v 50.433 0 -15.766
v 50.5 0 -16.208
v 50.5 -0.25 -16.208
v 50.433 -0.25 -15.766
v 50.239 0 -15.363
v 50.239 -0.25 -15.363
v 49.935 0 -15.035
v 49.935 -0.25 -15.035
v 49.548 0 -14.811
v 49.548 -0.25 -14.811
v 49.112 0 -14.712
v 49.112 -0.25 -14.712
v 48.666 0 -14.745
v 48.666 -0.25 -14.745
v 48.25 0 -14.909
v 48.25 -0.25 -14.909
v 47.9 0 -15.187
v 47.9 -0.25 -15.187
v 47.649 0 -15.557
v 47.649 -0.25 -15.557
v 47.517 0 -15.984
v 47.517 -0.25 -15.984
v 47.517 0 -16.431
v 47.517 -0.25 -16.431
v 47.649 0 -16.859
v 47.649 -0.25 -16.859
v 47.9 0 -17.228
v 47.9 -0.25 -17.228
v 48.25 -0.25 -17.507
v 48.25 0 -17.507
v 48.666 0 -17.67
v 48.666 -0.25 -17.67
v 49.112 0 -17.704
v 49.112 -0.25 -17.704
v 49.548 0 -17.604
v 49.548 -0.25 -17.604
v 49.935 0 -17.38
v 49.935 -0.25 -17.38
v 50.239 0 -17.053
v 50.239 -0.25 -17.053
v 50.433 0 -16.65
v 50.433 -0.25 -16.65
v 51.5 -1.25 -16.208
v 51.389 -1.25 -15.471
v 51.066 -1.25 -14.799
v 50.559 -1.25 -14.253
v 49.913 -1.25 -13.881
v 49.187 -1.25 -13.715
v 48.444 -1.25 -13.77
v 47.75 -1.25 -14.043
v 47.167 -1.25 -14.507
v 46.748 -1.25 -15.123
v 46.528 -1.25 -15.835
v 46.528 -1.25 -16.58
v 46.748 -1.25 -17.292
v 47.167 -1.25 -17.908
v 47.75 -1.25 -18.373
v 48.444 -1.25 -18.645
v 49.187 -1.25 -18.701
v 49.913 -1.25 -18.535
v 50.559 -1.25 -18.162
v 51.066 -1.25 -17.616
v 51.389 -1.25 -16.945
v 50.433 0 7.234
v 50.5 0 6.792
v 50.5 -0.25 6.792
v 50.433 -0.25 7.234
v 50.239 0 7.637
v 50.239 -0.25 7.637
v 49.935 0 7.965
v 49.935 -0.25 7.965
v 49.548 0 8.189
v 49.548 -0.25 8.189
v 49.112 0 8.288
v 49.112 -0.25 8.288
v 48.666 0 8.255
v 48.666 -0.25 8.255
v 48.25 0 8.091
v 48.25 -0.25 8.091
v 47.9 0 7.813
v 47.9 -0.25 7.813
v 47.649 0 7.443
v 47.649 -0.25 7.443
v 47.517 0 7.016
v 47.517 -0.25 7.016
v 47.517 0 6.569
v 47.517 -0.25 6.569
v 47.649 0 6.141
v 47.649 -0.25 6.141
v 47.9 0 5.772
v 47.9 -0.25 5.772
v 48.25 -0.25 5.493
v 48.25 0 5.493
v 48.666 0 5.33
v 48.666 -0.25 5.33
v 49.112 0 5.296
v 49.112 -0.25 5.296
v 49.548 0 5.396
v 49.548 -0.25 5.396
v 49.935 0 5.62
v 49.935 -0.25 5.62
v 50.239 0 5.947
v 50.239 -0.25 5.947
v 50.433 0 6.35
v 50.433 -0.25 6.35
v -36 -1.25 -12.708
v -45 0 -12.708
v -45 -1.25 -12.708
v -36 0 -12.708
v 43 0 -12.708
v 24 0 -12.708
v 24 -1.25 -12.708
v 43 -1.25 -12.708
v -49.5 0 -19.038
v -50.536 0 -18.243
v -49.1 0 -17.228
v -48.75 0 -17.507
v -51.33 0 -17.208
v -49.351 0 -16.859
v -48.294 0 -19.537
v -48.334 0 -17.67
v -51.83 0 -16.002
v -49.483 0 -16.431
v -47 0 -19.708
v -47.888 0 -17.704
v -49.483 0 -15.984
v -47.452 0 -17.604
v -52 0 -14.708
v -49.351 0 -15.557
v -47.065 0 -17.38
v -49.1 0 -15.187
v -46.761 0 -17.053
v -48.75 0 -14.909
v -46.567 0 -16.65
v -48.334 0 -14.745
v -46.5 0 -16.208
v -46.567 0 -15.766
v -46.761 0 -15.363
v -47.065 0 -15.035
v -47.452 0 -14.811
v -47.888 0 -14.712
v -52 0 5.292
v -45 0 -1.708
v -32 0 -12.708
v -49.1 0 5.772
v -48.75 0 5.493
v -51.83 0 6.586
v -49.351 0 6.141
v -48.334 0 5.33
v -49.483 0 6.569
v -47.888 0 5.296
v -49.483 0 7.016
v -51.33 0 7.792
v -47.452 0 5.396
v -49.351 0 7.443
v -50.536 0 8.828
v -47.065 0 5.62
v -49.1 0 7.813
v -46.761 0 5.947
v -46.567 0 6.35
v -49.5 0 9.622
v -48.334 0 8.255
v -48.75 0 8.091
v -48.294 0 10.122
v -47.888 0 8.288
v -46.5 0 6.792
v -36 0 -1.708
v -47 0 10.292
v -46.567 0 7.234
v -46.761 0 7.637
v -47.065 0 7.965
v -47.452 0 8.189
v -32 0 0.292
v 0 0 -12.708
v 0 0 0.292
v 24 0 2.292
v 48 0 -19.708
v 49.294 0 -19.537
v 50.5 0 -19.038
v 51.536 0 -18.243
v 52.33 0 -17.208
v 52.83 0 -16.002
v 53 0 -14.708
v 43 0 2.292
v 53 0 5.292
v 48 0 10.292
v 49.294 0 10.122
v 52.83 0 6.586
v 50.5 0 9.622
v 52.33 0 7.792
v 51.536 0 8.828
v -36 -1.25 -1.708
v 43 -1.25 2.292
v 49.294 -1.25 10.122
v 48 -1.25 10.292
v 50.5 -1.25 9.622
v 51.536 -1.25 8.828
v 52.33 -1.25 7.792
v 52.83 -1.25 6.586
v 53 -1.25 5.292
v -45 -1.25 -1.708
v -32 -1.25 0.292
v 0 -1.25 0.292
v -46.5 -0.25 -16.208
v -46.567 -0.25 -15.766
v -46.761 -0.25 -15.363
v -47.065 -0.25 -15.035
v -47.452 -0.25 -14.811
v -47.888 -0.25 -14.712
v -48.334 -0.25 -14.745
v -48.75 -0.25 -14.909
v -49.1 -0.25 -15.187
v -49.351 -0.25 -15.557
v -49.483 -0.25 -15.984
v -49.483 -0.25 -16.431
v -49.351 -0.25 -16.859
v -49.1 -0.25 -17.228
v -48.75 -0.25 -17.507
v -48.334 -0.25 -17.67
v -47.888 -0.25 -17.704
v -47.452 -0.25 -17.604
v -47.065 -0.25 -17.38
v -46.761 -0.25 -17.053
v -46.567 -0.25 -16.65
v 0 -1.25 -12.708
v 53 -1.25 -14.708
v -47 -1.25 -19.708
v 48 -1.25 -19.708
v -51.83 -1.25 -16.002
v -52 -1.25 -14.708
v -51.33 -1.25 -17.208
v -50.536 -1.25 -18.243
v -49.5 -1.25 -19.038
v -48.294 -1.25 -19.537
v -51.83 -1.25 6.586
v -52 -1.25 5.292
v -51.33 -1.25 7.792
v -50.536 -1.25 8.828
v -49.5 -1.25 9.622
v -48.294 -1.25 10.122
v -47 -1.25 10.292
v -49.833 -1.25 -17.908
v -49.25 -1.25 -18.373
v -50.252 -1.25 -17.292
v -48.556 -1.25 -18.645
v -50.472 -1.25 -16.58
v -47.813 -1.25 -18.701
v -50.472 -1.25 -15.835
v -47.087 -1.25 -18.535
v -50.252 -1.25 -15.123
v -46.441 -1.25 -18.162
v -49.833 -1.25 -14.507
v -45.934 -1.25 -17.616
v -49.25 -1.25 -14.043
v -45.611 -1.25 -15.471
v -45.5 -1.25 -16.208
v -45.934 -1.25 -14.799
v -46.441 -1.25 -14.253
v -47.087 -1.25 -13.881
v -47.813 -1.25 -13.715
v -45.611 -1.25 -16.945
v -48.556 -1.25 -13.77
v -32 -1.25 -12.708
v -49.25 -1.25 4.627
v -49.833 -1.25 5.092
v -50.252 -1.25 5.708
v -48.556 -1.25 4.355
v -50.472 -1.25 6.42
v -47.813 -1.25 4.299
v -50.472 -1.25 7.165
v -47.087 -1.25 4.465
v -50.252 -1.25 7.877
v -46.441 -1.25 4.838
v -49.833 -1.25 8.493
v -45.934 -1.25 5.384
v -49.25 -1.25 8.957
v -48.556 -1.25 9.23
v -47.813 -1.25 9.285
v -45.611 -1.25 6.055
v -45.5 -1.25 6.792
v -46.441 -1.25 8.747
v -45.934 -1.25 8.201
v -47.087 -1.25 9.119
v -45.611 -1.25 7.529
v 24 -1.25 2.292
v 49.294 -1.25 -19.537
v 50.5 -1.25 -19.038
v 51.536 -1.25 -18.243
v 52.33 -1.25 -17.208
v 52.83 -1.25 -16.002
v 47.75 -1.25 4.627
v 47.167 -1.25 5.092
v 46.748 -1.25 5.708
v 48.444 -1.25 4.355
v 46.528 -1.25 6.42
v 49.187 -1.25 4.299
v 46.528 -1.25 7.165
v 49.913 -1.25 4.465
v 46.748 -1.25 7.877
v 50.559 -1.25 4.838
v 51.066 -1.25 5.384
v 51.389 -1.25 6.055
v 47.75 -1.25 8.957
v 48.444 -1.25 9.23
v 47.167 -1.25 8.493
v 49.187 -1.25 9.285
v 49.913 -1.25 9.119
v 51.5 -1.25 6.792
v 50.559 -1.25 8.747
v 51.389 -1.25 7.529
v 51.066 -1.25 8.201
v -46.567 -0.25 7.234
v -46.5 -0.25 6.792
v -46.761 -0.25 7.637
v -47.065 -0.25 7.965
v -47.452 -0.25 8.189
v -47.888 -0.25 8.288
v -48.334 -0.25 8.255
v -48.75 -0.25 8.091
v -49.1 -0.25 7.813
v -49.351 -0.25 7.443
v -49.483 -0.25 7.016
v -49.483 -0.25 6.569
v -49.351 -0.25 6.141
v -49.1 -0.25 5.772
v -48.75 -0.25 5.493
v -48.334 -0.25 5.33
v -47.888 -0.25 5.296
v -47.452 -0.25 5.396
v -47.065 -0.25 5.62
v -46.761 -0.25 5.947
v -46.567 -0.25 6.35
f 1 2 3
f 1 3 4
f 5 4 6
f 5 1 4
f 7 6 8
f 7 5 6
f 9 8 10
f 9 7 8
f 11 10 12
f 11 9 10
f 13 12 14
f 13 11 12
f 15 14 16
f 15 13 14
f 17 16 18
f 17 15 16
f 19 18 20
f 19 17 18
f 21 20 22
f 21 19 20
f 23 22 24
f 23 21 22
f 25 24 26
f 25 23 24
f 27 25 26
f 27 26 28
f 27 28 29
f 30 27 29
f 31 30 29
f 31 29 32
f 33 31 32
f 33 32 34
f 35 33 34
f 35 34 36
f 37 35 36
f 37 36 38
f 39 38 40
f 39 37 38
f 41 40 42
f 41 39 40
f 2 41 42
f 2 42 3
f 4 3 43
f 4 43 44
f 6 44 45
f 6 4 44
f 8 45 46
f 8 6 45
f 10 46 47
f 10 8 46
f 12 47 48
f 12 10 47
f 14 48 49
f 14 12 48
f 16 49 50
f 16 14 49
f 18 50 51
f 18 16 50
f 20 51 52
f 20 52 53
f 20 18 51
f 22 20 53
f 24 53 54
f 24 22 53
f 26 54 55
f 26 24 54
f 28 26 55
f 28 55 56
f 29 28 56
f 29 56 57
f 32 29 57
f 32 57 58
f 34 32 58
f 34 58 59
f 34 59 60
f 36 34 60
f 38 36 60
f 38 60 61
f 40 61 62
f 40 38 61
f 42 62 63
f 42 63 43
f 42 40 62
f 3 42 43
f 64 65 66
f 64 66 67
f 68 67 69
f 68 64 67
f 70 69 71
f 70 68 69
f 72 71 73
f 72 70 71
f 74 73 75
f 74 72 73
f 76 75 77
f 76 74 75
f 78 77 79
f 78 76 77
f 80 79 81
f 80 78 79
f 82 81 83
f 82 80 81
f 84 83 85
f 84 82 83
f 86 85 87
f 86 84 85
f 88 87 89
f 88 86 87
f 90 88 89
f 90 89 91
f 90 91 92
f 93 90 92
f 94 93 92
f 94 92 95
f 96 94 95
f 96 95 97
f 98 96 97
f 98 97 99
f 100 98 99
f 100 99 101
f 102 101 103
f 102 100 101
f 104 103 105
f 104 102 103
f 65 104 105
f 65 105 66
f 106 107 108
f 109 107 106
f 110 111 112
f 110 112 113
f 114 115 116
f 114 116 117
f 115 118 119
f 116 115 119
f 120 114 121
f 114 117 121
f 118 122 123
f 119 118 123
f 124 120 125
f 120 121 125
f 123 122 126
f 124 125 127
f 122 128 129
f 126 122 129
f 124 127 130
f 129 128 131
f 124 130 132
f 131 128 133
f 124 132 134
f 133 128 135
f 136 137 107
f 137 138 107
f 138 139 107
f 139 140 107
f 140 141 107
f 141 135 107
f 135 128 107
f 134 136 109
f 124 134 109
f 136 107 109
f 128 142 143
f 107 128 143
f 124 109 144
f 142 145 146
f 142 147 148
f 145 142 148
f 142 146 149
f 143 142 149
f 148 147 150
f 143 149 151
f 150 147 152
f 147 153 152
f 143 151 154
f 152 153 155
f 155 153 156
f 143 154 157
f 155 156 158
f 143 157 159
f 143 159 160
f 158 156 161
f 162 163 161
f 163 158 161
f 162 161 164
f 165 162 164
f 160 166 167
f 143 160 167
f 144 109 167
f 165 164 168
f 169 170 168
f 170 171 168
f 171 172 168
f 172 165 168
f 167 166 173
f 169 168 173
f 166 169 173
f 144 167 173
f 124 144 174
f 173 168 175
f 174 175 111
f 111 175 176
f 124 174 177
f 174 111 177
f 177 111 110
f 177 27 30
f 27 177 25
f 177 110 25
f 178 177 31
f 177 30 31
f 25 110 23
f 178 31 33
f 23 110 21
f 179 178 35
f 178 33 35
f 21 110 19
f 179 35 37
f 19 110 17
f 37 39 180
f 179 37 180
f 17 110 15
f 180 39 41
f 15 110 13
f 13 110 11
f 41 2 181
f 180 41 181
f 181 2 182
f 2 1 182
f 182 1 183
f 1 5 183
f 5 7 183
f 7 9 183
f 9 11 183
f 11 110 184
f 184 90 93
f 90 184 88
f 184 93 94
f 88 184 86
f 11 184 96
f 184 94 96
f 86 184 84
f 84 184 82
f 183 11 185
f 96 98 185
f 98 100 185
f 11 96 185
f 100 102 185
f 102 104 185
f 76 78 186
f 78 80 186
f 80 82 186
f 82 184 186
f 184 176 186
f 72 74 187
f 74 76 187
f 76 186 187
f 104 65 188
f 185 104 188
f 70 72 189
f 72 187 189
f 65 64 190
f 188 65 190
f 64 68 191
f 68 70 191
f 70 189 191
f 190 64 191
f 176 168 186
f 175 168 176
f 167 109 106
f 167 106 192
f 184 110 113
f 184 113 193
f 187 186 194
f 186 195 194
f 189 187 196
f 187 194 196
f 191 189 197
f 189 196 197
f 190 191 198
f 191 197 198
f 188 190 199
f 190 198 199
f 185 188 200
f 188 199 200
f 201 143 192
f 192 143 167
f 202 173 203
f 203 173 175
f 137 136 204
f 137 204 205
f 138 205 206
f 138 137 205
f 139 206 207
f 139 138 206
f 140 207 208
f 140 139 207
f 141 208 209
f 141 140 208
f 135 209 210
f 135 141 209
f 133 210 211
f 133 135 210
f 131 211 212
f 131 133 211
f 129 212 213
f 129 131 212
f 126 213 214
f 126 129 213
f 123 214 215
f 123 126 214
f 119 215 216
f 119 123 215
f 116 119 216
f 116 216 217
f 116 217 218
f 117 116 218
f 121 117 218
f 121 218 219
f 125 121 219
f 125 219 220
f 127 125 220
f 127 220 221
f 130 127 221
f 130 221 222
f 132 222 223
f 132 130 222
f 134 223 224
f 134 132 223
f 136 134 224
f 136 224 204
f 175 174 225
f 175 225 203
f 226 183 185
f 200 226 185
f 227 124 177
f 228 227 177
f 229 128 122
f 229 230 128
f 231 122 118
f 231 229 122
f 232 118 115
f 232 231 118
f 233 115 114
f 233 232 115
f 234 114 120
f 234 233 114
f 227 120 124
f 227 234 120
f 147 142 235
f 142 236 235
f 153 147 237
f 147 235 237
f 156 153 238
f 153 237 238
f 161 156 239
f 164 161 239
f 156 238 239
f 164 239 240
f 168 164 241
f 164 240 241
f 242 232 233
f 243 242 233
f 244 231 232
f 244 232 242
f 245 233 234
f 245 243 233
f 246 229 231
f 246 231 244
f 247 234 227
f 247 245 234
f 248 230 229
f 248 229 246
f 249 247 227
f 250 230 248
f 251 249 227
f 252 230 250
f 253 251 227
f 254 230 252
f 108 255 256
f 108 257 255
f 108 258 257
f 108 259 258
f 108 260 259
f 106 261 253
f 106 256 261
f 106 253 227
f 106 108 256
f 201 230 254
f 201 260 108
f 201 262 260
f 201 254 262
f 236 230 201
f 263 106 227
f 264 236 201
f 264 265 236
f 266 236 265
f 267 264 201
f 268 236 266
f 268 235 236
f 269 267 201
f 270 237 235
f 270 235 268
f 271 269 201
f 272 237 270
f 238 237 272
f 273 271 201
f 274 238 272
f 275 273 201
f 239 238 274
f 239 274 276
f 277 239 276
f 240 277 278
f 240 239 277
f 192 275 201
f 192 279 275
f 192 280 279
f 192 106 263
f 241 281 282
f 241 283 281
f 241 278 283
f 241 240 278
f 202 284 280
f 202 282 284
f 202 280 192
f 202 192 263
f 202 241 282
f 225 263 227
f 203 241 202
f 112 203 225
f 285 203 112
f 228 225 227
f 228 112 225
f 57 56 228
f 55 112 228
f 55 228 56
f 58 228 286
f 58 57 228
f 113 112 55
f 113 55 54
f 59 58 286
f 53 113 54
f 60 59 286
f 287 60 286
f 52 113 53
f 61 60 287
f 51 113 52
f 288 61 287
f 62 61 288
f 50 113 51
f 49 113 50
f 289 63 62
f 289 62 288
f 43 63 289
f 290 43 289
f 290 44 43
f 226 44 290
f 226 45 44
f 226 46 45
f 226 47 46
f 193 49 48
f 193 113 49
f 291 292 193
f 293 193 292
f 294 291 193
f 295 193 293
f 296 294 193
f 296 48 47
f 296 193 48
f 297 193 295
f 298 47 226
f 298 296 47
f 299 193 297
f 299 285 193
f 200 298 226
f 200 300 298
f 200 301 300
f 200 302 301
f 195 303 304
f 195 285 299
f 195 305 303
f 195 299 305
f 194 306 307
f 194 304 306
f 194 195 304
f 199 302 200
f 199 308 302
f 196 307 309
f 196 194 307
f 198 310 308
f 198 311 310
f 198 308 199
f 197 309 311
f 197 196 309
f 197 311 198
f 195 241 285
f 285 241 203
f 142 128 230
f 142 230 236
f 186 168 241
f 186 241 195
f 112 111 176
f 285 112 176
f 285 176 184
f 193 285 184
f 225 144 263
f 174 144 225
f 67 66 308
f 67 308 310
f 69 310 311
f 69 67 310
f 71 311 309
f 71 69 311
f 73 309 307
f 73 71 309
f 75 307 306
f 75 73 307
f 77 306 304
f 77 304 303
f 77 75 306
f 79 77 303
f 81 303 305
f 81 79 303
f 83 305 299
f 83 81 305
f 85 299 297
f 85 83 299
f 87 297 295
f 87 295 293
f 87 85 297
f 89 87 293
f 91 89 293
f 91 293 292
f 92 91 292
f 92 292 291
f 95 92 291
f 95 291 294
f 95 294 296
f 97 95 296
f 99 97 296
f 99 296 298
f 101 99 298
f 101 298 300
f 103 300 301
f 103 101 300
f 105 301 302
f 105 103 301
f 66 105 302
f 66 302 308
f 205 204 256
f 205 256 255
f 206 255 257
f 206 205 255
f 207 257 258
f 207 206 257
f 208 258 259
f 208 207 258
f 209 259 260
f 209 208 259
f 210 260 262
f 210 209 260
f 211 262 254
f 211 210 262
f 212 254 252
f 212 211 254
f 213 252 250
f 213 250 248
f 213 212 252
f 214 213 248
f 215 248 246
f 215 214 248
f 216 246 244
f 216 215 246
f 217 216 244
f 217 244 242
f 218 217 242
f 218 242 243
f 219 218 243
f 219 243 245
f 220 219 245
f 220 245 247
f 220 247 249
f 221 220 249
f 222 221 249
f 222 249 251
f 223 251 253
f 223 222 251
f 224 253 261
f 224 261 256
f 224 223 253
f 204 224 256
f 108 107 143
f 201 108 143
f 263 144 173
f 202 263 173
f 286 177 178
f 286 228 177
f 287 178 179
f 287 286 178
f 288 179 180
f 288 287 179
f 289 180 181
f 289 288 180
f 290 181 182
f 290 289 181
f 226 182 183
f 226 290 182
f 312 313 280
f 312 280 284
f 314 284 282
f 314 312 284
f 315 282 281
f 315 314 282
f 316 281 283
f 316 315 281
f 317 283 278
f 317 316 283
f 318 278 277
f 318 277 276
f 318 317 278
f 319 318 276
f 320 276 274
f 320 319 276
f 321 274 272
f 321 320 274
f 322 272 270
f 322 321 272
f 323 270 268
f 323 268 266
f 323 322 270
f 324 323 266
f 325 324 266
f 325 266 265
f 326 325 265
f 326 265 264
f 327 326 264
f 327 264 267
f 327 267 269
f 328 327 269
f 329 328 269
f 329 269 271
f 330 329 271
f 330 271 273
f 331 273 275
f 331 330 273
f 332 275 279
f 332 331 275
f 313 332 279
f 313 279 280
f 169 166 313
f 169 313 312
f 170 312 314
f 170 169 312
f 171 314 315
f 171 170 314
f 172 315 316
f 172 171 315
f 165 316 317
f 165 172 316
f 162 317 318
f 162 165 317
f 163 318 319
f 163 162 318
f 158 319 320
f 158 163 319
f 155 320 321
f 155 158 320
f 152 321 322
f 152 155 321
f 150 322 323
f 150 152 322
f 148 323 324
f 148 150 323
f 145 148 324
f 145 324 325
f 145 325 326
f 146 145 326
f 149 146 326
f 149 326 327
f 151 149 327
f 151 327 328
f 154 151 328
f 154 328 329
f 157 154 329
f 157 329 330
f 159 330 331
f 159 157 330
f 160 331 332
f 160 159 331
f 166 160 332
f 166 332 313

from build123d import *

# Parameters (mm, degrees)
F0_W     = 105
F0_H     = 30
F0_R     = 1.5
F0_W_2   = 9
F0_H_2   = 11
F0_W_3   = 32
F0_H_3   = 13
F0_W_4   = 19
F0_H_4   = 15
F1_DEPTH = 1.25
F2_R     = 5
F3_SIZE  = 1


with BuildPart() as f1:
    # F0 (on Front) → F1 (new body)
    with BuildSketch(Plane.XZ):
        with Locations((0.5, -4.707695)):
            Rectangle(F0_W, F0_H)
        with Locations((-48, -16.207695)):
            Circle(F0_R, mode=Mode.SUBTRACT)
        with Locations((-40.5, -7.207695)):
            Rectangle(F0_W_2, F0_H_2, mode=Mode.SUBTRACT)
        with Locations((-16, -6.207695)):
            Rectangle(F0_W_3, F0_H_3, mode=Mode.SUBTRACT)
        with Locations((49, -16.207695)):
            Circle(F0_R, mode=Mode.SUBTRACT)
        with Locations((33.5, -5.207695)):
            Rectangle(F0_W_4, F0_H_4, mode=Mode.SUBTRACT)
        with Locations((-48, 6.792305)):
            Circle(F0_R, mode=Mode.SUBTRACT)
        with Locations((49, 6.792305)):
            Circle(F0_R, mode=Mode.SUBTRACT)
    extrude(amount=F1_DEPTH)

    # F2
    f2_edges = [f1.edges().sort_by_distance(p)[0] for p in [
        (53, -0.625, 10.292305),
        (53, -0.625, -19.707695),
        (-52, -0.625, -19.707695),
        (-52, -0.625, 10.292305),
    ]]
    fillet(f2_edges, radius=F2_R)

    # F3
    f3_edges = [f1.edges().sort_by_distance(p)[0] for p in [
        (47.5, -1.25, 6.792305),
        (47.5, -1.25, -16.207695),
        (-49.5, -1.25, -16.207695),
        (-49.5, -1.25, 6.792305),
    ]]
    chamfer(f3_edges, length=F3_SIZE)


solid = f1.part
